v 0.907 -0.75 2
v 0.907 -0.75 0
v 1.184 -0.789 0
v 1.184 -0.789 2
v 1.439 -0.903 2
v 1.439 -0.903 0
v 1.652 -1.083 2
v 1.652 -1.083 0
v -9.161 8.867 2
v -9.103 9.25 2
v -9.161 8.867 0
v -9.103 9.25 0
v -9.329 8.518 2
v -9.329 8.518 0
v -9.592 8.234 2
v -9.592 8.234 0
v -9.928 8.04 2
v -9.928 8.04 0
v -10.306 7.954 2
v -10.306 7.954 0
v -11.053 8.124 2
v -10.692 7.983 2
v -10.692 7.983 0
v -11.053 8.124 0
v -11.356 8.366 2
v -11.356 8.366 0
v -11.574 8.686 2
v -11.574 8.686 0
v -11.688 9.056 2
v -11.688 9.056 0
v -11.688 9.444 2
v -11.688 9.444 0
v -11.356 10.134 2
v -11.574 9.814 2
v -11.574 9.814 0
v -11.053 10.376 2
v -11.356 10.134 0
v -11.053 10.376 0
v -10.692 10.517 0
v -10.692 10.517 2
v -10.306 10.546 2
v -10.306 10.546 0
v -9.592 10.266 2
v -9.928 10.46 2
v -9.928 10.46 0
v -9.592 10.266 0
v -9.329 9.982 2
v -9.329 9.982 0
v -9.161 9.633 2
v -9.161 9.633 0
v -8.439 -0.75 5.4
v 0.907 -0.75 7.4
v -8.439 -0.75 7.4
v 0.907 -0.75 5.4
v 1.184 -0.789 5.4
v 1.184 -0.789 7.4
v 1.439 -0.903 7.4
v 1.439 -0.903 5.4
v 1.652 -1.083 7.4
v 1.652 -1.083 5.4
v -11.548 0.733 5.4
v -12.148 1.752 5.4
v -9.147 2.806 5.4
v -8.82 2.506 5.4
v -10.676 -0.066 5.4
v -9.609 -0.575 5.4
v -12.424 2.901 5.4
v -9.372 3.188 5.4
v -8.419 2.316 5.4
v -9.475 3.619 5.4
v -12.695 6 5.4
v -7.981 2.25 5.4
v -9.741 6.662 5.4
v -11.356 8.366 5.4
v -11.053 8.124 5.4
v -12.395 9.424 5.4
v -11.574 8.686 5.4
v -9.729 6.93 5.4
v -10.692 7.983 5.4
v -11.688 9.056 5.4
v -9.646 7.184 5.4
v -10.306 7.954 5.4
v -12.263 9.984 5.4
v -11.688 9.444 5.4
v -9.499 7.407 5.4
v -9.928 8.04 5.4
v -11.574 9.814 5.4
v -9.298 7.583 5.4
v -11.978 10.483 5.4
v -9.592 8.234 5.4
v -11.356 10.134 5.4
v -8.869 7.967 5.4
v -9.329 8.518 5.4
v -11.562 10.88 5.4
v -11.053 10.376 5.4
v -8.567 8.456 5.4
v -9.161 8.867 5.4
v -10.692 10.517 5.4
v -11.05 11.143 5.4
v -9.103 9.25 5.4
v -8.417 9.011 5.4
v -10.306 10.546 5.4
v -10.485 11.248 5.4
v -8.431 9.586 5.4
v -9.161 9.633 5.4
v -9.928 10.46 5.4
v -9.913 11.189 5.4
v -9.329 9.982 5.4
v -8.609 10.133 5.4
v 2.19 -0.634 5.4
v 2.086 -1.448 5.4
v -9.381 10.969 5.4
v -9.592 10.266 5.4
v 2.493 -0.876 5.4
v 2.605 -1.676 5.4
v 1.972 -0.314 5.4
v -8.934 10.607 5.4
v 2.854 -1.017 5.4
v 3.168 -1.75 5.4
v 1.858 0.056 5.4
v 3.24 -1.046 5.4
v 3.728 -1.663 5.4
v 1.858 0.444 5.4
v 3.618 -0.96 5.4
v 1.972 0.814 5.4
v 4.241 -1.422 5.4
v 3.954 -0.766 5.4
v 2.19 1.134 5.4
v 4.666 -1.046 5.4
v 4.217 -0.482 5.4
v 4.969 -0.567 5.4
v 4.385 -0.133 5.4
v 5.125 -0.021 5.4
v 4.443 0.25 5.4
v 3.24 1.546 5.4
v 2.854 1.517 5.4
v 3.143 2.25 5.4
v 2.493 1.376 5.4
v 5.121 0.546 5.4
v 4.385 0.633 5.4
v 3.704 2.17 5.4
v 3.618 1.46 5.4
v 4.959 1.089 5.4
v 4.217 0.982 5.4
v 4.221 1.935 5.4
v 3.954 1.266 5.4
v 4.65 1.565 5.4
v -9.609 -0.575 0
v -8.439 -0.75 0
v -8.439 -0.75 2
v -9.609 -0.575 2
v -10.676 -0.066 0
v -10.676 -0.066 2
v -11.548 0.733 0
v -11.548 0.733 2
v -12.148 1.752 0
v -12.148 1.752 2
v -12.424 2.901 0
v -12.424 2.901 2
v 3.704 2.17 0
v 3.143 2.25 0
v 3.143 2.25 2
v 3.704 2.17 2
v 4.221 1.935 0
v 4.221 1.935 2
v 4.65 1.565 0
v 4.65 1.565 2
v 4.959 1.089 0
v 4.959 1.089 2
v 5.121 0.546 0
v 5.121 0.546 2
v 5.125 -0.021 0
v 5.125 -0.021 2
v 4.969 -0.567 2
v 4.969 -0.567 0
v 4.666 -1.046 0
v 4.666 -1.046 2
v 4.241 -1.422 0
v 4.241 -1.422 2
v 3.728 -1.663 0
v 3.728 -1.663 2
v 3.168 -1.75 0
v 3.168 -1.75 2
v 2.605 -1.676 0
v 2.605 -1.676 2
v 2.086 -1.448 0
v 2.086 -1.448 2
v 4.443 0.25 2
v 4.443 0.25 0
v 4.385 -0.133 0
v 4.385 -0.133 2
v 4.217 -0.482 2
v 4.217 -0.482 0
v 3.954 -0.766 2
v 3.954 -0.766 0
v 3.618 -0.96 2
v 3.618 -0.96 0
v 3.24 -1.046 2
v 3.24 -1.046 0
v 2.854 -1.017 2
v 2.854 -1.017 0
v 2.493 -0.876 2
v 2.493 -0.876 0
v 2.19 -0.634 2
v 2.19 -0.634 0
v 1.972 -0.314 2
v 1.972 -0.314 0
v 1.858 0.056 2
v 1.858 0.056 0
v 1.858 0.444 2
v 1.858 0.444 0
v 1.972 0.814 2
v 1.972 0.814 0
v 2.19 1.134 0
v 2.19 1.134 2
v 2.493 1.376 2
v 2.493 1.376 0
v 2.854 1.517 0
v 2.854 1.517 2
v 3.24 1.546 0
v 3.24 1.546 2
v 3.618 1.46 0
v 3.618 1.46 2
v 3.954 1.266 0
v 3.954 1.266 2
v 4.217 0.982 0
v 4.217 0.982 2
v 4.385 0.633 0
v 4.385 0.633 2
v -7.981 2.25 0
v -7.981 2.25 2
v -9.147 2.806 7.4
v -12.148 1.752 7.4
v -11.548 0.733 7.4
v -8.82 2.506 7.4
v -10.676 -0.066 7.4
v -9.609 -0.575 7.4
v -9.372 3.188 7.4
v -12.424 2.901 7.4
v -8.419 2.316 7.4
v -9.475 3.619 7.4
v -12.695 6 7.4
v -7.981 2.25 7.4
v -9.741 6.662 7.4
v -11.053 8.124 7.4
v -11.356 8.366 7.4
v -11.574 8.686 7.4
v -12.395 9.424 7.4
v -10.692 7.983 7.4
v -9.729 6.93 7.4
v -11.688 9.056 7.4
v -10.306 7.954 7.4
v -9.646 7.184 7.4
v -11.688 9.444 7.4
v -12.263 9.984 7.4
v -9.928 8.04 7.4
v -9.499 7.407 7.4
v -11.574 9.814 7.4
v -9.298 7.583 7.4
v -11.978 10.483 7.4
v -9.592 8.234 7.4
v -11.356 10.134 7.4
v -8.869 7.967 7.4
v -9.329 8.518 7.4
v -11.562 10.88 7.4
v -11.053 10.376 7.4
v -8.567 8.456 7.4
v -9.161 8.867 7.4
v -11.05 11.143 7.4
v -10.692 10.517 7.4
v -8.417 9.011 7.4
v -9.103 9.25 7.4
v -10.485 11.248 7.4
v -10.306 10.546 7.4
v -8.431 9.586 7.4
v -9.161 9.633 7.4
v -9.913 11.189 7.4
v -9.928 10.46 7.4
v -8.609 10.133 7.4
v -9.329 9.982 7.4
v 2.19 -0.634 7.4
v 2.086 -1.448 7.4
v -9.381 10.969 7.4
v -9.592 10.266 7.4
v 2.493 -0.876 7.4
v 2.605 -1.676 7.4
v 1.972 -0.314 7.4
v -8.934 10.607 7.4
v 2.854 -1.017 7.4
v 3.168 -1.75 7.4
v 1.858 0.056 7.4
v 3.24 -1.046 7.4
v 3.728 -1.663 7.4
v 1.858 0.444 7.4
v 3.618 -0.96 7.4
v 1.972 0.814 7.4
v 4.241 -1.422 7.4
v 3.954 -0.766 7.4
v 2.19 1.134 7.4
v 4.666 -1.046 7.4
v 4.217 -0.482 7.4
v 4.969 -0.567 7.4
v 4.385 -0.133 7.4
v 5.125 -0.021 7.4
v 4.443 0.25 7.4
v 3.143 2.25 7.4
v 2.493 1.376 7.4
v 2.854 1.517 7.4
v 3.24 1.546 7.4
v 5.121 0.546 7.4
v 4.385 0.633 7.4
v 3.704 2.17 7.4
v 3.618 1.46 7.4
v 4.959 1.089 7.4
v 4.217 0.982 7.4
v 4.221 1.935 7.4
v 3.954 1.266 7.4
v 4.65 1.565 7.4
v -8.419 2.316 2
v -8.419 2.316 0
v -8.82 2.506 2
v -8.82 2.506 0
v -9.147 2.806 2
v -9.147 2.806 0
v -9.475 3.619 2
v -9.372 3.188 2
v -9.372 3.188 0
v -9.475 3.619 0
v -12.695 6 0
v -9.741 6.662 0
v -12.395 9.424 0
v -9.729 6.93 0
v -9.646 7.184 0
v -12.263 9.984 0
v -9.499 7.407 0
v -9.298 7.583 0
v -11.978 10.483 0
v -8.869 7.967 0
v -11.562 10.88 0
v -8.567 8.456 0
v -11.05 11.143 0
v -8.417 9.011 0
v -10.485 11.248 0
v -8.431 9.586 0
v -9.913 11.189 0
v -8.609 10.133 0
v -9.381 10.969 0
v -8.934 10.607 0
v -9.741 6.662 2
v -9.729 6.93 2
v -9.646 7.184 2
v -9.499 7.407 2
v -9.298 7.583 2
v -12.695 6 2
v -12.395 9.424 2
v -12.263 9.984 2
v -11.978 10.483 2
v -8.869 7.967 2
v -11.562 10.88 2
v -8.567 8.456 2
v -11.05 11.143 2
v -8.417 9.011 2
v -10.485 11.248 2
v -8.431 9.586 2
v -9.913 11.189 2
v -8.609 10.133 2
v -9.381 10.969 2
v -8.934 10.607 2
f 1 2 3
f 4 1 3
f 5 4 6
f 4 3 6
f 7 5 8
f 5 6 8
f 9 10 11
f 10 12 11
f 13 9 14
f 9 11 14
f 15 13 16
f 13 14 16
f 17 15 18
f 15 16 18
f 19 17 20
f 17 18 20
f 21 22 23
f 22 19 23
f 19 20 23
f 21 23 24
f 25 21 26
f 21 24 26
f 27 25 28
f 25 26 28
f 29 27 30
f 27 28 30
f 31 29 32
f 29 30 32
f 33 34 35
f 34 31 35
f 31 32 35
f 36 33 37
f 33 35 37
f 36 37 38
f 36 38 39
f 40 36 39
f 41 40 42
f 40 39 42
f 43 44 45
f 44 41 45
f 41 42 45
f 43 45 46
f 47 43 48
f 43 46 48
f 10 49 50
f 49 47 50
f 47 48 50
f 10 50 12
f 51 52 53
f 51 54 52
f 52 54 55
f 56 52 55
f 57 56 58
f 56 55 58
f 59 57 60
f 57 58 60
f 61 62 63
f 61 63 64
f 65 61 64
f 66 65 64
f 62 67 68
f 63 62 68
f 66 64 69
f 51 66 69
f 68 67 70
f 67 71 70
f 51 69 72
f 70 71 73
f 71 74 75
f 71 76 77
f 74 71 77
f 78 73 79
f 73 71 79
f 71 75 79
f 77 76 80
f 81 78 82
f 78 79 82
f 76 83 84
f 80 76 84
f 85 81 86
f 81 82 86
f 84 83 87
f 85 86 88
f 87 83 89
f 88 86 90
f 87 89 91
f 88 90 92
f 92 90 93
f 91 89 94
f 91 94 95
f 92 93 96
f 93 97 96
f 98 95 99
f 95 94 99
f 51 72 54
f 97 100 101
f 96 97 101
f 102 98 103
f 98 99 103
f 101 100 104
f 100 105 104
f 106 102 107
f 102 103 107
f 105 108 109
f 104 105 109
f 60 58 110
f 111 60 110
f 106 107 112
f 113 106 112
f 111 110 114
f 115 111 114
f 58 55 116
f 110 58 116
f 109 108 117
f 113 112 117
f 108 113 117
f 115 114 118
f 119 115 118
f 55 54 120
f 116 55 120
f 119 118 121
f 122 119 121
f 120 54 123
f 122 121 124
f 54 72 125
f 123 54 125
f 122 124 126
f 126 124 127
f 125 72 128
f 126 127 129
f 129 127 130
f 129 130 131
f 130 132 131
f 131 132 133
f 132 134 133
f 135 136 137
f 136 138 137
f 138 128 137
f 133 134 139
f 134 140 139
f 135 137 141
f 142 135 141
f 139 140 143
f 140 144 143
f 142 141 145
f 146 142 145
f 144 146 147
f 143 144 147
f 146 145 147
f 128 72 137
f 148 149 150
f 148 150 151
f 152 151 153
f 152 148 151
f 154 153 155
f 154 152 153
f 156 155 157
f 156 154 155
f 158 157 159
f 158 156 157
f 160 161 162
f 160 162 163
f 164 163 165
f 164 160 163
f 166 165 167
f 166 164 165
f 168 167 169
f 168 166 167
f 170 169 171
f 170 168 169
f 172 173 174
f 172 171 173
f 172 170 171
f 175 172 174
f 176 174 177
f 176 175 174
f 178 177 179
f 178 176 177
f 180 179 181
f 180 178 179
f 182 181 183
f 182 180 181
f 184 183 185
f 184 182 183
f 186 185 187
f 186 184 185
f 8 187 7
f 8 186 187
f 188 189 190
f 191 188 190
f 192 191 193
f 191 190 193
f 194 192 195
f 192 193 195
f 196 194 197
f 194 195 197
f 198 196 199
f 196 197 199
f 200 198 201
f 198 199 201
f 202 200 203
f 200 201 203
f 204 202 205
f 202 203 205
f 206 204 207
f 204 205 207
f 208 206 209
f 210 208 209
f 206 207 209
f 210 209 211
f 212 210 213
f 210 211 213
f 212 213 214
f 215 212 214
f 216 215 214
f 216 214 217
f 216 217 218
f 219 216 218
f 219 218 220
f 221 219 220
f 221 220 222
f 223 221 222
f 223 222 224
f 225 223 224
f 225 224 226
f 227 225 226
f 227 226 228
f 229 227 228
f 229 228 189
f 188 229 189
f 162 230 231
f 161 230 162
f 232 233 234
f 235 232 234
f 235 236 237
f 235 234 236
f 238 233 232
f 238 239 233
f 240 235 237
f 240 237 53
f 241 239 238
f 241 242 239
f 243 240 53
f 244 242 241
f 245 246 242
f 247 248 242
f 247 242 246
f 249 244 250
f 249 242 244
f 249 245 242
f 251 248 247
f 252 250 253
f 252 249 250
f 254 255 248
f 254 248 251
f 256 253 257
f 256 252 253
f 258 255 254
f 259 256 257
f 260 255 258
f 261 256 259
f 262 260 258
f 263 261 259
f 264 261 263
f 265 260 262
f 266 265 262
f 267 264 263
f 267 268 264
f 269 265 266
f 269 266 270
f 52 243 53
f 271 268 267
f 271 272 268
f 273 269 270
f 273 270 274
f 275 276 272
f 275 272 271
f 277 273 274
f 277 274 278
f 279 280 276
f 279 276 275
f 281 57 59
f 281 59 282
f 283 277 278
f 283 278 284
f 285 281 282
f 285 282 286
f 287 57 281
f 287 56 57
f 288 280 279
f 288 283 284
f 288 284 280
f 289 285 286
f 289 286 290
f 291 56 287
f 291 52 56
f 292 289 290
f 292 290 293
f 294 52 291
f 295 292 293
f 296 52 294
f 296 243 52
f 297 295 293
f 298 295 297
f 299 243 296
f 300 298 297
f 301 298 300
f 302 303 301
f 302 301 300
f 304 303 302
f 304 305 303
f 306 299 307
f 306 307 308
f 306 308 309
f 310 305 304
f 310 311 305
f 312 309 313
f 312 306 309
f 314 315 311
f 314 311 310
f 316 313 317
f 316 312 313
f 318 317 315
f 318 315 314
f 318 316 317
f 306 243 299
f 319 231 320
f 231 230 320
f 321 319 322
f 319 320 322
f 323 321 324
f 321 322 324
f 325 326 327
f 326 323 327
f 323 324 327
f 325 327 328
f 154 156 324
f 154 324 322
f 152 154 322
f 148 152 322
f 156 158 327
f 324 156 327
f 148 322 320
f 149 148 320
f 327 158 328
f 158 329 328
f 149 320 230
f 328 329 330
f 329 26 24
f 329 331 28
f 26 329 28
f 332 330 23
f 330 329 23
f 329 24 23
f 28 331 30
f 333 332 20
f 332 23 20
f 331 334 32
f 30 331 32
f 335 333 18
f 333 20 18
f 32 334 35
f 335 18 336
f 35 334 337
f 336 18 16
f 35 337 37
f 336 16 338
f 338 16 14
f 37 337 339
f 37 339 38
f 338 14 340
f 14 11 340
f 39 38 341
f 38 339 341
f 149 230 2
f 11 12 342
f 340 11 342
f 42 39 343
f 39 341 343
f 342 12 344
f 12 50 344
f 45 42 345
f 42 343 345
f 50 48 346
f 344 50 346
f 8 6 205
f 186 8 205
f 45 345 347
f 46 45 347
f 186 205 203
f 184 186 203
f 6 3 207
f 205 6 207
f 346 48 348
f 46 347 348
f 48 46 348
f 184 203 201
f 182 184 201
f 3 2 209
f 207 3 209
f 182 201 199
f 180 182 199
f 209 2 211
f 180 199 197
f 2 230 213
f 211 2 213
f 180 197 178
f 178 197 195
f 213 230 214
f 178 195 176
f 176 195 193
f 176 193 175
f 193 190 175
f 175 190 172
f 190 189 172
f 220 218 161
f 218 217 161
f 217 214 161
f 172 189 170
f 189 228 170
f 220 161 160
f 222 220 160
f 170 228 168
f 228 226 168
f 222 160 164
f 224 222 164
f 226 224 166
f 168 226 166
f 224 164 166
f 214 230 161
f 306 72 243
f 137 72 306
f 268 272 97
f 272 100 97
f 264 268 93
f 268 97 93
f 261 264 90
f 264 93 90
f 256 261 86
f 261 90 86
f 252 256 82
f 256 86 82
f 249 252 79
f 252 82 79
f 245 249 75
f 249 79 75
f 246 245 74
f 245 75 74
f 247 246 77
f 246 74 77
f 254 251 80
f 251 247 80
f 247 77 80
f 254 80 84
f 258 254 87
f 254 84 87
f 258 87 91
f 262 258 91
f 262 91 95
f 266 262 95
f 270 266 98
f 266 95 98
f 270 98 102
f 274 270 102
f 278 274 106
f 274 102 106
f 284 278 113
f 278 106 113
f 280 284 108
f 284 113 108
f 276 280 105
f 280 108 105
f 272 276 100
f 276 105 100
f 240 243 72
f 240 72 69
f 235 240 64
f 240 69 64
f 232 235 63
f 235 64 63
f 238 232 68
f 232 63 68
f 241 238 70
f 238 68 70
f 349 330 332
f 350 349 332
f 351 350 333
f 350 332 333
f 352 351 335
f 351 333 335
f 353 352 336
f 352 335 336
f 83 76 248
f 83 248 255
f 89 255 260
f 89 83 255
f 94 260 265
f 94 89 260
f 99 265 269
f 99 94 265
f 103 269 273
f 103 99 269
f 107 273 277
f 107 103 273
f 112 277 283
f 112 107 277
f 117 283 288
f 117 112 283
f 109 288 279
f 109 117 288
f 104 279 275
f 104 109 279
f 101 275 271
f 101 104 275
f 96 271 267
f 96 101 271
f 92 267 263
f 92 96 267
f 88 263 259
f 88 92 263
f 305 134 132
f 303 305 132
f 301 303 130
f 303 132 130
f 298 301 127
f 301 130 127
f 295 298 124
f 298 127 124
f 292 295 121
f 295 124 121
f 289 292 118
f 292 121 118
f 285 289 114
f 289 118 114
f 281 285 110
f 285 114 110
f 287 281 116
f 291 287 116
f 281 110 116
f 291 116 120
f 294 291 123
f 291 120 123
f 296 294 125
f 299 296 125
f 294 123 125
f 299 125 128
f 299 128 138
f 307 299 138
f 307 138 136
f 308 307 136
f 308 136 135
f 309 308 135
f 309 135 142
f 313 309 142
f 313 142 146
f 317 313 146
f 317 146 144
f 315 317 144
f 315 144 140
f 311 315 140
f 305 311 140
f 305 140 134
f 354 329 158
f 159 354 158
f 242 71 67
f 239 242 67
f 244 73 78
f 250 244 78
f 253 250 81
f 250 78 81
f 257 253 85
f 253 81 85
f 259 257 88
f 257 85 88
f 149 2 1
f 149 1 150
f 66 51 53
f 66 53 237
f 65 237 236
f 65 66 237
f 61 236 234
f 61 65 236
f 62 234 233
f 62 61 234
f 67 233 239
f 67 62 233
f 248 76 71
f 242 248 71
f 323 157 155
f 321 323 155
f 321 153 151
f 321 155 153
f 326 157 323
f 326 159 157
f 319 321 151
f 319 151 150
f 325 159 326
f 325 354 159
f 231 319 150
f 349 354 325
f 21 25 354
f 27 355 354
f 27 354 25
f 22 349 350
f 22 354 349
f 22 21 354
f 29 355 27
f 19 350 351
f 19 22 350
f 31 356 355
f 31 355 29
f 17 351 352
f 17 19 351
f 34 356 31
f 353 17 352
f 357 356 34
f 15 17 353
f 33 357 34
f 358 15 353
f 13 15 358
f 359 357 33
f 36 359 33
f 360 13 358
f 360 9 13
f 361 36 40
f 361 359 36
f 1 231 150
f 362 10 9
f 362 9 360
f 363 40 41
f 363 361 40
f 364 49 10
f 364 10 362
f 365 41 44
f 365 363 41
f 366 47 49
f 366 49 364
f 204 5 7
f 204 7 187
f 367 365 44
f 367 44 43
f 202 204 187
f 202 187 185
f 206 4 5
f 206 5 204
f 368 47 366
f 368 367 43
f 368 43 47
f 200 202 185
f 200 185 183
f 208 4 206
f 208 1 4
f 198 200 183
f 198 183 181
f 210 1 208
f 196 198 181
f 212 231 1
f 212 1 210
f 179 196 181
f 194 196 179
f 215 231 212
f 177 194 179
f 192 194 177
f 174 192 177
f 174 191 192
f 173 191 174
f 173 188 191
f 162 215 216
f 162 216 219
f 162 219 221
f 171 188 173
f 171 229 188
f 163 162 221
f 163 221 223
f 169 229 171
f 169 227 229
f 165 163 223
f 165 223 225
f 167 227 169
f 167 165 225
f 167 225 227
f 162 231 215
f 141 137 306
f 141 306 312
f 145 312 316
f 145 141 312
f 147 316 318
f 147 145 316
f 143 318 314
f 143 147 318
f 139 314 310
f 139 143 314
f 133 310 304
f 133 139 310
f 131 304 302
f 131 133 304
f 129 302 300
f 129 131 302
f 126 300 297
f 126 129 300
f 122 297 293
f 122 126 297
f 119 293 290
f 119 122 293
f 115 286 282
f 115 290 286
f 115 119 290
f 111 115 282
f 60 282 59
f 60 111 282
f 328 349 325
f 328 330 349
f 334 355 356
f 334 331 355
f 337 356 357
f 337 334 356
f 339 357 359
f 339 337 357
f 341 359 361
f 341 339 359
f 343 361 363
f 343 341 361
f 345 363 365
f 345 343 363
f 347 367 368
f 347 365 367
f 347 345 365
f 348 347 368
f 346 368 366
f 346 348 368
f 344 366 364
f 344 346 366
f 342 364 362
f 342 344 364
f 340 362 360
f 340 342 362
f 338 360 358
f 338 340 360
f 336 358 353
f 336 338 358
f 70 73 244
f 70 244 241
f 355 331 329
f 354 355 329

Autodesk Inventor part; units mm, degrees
ref_plane "YZ Plane" through (0, 0, 0) normal (1, 0, 0) x (0, 1, 0)
ref_plane "XZ Plane" through (0, 0, 0) normal (0, 1, 0) x (-1, 0, 0)
ref_plane "XY Plane" through (0, 0, 0) normal (0, 0, 1) x (1, 0, 0)
sketch "Sketch1" plane through (0, 0, 0) normal (0, 0, 1) x (1, 0, 0)
  line L0 (-16.9176, 0) -> (9.5691, 0) projected
  arc A0 (-9.2978, 7.5831) -> (-12.3954, 9.4243) centre (-10.403, 9.25) ccw
  arc A1 (1.6523, -1.0833) -> (3.1431, 2.25) centre (3.1431, 0.25) ccw
  line L1 (-12.3954, 9.4243) -> (-12.6949, 6)
  line L2 (-12.6949, 6) -> (-12.4238, 2.9014)
  line L3 (-9.7414, 6.6625) -> (-9.4752, 3.6193)
  line L4 (-7.9809, 2.25) -> (3.1431, 2.25)
  line L5 (0.907, -0.75) -> (-8.4391, -0.75)
  arc A2 (-9.2978, 7.5831) -> (-9.7414, 6.6625) centre (-8.7452, 6.7496) ccw
  arc A3 (-9.4752, 3.6193) -> (-7.9809, 2.25) centre (-7.9809, 3.75) ccw
  arc A4 (-12.4238, 2.9014) -> (-8.4391, -0.75) centre (-8.4391, 3.25) ccw
  arc A5 (1.6523, -1.0833) -> (0.907, -0.75) centre (0.907, -1.75) ccw
  circle A6 centre (-10.403, 9.25) radius 1.3
  circle A7 centre (3.1431, 0.25) radius 1.3
  line L6 (-10.403, 9.25) -> (3.1431, 0.25) construction
  point P0 (0, 0)
  dimension "d4" = 3
  dimension "d5" = 4
  dimension "d6" = 3
  dimension "d13" = 6
  dimension "d15" = 1
  dimension "d16" = 1.5
  dimension "d17" = 4
  dimension "d18" = 1
  dimension "d27" = 10
  dimension "d31" = 95
  dimension "d32" = 2.6
  dimension "d34" = 0.75
  dimension "d39" = 7
  dimension "d41" = 13.546
extrude "Extrusion1" add sketch "Sketch1" along normal blind 2 contours A4 L2 L1 A0 A2 L3 A3 L4 A1 L0 A7 | L0 A7 A1 A5 L5 A4
pattern_linear "Rectangular Pattern1" count 2 spacing 5.4 along (0, 0, 1)
properties part number "D26 Linkages" material "Steel"
